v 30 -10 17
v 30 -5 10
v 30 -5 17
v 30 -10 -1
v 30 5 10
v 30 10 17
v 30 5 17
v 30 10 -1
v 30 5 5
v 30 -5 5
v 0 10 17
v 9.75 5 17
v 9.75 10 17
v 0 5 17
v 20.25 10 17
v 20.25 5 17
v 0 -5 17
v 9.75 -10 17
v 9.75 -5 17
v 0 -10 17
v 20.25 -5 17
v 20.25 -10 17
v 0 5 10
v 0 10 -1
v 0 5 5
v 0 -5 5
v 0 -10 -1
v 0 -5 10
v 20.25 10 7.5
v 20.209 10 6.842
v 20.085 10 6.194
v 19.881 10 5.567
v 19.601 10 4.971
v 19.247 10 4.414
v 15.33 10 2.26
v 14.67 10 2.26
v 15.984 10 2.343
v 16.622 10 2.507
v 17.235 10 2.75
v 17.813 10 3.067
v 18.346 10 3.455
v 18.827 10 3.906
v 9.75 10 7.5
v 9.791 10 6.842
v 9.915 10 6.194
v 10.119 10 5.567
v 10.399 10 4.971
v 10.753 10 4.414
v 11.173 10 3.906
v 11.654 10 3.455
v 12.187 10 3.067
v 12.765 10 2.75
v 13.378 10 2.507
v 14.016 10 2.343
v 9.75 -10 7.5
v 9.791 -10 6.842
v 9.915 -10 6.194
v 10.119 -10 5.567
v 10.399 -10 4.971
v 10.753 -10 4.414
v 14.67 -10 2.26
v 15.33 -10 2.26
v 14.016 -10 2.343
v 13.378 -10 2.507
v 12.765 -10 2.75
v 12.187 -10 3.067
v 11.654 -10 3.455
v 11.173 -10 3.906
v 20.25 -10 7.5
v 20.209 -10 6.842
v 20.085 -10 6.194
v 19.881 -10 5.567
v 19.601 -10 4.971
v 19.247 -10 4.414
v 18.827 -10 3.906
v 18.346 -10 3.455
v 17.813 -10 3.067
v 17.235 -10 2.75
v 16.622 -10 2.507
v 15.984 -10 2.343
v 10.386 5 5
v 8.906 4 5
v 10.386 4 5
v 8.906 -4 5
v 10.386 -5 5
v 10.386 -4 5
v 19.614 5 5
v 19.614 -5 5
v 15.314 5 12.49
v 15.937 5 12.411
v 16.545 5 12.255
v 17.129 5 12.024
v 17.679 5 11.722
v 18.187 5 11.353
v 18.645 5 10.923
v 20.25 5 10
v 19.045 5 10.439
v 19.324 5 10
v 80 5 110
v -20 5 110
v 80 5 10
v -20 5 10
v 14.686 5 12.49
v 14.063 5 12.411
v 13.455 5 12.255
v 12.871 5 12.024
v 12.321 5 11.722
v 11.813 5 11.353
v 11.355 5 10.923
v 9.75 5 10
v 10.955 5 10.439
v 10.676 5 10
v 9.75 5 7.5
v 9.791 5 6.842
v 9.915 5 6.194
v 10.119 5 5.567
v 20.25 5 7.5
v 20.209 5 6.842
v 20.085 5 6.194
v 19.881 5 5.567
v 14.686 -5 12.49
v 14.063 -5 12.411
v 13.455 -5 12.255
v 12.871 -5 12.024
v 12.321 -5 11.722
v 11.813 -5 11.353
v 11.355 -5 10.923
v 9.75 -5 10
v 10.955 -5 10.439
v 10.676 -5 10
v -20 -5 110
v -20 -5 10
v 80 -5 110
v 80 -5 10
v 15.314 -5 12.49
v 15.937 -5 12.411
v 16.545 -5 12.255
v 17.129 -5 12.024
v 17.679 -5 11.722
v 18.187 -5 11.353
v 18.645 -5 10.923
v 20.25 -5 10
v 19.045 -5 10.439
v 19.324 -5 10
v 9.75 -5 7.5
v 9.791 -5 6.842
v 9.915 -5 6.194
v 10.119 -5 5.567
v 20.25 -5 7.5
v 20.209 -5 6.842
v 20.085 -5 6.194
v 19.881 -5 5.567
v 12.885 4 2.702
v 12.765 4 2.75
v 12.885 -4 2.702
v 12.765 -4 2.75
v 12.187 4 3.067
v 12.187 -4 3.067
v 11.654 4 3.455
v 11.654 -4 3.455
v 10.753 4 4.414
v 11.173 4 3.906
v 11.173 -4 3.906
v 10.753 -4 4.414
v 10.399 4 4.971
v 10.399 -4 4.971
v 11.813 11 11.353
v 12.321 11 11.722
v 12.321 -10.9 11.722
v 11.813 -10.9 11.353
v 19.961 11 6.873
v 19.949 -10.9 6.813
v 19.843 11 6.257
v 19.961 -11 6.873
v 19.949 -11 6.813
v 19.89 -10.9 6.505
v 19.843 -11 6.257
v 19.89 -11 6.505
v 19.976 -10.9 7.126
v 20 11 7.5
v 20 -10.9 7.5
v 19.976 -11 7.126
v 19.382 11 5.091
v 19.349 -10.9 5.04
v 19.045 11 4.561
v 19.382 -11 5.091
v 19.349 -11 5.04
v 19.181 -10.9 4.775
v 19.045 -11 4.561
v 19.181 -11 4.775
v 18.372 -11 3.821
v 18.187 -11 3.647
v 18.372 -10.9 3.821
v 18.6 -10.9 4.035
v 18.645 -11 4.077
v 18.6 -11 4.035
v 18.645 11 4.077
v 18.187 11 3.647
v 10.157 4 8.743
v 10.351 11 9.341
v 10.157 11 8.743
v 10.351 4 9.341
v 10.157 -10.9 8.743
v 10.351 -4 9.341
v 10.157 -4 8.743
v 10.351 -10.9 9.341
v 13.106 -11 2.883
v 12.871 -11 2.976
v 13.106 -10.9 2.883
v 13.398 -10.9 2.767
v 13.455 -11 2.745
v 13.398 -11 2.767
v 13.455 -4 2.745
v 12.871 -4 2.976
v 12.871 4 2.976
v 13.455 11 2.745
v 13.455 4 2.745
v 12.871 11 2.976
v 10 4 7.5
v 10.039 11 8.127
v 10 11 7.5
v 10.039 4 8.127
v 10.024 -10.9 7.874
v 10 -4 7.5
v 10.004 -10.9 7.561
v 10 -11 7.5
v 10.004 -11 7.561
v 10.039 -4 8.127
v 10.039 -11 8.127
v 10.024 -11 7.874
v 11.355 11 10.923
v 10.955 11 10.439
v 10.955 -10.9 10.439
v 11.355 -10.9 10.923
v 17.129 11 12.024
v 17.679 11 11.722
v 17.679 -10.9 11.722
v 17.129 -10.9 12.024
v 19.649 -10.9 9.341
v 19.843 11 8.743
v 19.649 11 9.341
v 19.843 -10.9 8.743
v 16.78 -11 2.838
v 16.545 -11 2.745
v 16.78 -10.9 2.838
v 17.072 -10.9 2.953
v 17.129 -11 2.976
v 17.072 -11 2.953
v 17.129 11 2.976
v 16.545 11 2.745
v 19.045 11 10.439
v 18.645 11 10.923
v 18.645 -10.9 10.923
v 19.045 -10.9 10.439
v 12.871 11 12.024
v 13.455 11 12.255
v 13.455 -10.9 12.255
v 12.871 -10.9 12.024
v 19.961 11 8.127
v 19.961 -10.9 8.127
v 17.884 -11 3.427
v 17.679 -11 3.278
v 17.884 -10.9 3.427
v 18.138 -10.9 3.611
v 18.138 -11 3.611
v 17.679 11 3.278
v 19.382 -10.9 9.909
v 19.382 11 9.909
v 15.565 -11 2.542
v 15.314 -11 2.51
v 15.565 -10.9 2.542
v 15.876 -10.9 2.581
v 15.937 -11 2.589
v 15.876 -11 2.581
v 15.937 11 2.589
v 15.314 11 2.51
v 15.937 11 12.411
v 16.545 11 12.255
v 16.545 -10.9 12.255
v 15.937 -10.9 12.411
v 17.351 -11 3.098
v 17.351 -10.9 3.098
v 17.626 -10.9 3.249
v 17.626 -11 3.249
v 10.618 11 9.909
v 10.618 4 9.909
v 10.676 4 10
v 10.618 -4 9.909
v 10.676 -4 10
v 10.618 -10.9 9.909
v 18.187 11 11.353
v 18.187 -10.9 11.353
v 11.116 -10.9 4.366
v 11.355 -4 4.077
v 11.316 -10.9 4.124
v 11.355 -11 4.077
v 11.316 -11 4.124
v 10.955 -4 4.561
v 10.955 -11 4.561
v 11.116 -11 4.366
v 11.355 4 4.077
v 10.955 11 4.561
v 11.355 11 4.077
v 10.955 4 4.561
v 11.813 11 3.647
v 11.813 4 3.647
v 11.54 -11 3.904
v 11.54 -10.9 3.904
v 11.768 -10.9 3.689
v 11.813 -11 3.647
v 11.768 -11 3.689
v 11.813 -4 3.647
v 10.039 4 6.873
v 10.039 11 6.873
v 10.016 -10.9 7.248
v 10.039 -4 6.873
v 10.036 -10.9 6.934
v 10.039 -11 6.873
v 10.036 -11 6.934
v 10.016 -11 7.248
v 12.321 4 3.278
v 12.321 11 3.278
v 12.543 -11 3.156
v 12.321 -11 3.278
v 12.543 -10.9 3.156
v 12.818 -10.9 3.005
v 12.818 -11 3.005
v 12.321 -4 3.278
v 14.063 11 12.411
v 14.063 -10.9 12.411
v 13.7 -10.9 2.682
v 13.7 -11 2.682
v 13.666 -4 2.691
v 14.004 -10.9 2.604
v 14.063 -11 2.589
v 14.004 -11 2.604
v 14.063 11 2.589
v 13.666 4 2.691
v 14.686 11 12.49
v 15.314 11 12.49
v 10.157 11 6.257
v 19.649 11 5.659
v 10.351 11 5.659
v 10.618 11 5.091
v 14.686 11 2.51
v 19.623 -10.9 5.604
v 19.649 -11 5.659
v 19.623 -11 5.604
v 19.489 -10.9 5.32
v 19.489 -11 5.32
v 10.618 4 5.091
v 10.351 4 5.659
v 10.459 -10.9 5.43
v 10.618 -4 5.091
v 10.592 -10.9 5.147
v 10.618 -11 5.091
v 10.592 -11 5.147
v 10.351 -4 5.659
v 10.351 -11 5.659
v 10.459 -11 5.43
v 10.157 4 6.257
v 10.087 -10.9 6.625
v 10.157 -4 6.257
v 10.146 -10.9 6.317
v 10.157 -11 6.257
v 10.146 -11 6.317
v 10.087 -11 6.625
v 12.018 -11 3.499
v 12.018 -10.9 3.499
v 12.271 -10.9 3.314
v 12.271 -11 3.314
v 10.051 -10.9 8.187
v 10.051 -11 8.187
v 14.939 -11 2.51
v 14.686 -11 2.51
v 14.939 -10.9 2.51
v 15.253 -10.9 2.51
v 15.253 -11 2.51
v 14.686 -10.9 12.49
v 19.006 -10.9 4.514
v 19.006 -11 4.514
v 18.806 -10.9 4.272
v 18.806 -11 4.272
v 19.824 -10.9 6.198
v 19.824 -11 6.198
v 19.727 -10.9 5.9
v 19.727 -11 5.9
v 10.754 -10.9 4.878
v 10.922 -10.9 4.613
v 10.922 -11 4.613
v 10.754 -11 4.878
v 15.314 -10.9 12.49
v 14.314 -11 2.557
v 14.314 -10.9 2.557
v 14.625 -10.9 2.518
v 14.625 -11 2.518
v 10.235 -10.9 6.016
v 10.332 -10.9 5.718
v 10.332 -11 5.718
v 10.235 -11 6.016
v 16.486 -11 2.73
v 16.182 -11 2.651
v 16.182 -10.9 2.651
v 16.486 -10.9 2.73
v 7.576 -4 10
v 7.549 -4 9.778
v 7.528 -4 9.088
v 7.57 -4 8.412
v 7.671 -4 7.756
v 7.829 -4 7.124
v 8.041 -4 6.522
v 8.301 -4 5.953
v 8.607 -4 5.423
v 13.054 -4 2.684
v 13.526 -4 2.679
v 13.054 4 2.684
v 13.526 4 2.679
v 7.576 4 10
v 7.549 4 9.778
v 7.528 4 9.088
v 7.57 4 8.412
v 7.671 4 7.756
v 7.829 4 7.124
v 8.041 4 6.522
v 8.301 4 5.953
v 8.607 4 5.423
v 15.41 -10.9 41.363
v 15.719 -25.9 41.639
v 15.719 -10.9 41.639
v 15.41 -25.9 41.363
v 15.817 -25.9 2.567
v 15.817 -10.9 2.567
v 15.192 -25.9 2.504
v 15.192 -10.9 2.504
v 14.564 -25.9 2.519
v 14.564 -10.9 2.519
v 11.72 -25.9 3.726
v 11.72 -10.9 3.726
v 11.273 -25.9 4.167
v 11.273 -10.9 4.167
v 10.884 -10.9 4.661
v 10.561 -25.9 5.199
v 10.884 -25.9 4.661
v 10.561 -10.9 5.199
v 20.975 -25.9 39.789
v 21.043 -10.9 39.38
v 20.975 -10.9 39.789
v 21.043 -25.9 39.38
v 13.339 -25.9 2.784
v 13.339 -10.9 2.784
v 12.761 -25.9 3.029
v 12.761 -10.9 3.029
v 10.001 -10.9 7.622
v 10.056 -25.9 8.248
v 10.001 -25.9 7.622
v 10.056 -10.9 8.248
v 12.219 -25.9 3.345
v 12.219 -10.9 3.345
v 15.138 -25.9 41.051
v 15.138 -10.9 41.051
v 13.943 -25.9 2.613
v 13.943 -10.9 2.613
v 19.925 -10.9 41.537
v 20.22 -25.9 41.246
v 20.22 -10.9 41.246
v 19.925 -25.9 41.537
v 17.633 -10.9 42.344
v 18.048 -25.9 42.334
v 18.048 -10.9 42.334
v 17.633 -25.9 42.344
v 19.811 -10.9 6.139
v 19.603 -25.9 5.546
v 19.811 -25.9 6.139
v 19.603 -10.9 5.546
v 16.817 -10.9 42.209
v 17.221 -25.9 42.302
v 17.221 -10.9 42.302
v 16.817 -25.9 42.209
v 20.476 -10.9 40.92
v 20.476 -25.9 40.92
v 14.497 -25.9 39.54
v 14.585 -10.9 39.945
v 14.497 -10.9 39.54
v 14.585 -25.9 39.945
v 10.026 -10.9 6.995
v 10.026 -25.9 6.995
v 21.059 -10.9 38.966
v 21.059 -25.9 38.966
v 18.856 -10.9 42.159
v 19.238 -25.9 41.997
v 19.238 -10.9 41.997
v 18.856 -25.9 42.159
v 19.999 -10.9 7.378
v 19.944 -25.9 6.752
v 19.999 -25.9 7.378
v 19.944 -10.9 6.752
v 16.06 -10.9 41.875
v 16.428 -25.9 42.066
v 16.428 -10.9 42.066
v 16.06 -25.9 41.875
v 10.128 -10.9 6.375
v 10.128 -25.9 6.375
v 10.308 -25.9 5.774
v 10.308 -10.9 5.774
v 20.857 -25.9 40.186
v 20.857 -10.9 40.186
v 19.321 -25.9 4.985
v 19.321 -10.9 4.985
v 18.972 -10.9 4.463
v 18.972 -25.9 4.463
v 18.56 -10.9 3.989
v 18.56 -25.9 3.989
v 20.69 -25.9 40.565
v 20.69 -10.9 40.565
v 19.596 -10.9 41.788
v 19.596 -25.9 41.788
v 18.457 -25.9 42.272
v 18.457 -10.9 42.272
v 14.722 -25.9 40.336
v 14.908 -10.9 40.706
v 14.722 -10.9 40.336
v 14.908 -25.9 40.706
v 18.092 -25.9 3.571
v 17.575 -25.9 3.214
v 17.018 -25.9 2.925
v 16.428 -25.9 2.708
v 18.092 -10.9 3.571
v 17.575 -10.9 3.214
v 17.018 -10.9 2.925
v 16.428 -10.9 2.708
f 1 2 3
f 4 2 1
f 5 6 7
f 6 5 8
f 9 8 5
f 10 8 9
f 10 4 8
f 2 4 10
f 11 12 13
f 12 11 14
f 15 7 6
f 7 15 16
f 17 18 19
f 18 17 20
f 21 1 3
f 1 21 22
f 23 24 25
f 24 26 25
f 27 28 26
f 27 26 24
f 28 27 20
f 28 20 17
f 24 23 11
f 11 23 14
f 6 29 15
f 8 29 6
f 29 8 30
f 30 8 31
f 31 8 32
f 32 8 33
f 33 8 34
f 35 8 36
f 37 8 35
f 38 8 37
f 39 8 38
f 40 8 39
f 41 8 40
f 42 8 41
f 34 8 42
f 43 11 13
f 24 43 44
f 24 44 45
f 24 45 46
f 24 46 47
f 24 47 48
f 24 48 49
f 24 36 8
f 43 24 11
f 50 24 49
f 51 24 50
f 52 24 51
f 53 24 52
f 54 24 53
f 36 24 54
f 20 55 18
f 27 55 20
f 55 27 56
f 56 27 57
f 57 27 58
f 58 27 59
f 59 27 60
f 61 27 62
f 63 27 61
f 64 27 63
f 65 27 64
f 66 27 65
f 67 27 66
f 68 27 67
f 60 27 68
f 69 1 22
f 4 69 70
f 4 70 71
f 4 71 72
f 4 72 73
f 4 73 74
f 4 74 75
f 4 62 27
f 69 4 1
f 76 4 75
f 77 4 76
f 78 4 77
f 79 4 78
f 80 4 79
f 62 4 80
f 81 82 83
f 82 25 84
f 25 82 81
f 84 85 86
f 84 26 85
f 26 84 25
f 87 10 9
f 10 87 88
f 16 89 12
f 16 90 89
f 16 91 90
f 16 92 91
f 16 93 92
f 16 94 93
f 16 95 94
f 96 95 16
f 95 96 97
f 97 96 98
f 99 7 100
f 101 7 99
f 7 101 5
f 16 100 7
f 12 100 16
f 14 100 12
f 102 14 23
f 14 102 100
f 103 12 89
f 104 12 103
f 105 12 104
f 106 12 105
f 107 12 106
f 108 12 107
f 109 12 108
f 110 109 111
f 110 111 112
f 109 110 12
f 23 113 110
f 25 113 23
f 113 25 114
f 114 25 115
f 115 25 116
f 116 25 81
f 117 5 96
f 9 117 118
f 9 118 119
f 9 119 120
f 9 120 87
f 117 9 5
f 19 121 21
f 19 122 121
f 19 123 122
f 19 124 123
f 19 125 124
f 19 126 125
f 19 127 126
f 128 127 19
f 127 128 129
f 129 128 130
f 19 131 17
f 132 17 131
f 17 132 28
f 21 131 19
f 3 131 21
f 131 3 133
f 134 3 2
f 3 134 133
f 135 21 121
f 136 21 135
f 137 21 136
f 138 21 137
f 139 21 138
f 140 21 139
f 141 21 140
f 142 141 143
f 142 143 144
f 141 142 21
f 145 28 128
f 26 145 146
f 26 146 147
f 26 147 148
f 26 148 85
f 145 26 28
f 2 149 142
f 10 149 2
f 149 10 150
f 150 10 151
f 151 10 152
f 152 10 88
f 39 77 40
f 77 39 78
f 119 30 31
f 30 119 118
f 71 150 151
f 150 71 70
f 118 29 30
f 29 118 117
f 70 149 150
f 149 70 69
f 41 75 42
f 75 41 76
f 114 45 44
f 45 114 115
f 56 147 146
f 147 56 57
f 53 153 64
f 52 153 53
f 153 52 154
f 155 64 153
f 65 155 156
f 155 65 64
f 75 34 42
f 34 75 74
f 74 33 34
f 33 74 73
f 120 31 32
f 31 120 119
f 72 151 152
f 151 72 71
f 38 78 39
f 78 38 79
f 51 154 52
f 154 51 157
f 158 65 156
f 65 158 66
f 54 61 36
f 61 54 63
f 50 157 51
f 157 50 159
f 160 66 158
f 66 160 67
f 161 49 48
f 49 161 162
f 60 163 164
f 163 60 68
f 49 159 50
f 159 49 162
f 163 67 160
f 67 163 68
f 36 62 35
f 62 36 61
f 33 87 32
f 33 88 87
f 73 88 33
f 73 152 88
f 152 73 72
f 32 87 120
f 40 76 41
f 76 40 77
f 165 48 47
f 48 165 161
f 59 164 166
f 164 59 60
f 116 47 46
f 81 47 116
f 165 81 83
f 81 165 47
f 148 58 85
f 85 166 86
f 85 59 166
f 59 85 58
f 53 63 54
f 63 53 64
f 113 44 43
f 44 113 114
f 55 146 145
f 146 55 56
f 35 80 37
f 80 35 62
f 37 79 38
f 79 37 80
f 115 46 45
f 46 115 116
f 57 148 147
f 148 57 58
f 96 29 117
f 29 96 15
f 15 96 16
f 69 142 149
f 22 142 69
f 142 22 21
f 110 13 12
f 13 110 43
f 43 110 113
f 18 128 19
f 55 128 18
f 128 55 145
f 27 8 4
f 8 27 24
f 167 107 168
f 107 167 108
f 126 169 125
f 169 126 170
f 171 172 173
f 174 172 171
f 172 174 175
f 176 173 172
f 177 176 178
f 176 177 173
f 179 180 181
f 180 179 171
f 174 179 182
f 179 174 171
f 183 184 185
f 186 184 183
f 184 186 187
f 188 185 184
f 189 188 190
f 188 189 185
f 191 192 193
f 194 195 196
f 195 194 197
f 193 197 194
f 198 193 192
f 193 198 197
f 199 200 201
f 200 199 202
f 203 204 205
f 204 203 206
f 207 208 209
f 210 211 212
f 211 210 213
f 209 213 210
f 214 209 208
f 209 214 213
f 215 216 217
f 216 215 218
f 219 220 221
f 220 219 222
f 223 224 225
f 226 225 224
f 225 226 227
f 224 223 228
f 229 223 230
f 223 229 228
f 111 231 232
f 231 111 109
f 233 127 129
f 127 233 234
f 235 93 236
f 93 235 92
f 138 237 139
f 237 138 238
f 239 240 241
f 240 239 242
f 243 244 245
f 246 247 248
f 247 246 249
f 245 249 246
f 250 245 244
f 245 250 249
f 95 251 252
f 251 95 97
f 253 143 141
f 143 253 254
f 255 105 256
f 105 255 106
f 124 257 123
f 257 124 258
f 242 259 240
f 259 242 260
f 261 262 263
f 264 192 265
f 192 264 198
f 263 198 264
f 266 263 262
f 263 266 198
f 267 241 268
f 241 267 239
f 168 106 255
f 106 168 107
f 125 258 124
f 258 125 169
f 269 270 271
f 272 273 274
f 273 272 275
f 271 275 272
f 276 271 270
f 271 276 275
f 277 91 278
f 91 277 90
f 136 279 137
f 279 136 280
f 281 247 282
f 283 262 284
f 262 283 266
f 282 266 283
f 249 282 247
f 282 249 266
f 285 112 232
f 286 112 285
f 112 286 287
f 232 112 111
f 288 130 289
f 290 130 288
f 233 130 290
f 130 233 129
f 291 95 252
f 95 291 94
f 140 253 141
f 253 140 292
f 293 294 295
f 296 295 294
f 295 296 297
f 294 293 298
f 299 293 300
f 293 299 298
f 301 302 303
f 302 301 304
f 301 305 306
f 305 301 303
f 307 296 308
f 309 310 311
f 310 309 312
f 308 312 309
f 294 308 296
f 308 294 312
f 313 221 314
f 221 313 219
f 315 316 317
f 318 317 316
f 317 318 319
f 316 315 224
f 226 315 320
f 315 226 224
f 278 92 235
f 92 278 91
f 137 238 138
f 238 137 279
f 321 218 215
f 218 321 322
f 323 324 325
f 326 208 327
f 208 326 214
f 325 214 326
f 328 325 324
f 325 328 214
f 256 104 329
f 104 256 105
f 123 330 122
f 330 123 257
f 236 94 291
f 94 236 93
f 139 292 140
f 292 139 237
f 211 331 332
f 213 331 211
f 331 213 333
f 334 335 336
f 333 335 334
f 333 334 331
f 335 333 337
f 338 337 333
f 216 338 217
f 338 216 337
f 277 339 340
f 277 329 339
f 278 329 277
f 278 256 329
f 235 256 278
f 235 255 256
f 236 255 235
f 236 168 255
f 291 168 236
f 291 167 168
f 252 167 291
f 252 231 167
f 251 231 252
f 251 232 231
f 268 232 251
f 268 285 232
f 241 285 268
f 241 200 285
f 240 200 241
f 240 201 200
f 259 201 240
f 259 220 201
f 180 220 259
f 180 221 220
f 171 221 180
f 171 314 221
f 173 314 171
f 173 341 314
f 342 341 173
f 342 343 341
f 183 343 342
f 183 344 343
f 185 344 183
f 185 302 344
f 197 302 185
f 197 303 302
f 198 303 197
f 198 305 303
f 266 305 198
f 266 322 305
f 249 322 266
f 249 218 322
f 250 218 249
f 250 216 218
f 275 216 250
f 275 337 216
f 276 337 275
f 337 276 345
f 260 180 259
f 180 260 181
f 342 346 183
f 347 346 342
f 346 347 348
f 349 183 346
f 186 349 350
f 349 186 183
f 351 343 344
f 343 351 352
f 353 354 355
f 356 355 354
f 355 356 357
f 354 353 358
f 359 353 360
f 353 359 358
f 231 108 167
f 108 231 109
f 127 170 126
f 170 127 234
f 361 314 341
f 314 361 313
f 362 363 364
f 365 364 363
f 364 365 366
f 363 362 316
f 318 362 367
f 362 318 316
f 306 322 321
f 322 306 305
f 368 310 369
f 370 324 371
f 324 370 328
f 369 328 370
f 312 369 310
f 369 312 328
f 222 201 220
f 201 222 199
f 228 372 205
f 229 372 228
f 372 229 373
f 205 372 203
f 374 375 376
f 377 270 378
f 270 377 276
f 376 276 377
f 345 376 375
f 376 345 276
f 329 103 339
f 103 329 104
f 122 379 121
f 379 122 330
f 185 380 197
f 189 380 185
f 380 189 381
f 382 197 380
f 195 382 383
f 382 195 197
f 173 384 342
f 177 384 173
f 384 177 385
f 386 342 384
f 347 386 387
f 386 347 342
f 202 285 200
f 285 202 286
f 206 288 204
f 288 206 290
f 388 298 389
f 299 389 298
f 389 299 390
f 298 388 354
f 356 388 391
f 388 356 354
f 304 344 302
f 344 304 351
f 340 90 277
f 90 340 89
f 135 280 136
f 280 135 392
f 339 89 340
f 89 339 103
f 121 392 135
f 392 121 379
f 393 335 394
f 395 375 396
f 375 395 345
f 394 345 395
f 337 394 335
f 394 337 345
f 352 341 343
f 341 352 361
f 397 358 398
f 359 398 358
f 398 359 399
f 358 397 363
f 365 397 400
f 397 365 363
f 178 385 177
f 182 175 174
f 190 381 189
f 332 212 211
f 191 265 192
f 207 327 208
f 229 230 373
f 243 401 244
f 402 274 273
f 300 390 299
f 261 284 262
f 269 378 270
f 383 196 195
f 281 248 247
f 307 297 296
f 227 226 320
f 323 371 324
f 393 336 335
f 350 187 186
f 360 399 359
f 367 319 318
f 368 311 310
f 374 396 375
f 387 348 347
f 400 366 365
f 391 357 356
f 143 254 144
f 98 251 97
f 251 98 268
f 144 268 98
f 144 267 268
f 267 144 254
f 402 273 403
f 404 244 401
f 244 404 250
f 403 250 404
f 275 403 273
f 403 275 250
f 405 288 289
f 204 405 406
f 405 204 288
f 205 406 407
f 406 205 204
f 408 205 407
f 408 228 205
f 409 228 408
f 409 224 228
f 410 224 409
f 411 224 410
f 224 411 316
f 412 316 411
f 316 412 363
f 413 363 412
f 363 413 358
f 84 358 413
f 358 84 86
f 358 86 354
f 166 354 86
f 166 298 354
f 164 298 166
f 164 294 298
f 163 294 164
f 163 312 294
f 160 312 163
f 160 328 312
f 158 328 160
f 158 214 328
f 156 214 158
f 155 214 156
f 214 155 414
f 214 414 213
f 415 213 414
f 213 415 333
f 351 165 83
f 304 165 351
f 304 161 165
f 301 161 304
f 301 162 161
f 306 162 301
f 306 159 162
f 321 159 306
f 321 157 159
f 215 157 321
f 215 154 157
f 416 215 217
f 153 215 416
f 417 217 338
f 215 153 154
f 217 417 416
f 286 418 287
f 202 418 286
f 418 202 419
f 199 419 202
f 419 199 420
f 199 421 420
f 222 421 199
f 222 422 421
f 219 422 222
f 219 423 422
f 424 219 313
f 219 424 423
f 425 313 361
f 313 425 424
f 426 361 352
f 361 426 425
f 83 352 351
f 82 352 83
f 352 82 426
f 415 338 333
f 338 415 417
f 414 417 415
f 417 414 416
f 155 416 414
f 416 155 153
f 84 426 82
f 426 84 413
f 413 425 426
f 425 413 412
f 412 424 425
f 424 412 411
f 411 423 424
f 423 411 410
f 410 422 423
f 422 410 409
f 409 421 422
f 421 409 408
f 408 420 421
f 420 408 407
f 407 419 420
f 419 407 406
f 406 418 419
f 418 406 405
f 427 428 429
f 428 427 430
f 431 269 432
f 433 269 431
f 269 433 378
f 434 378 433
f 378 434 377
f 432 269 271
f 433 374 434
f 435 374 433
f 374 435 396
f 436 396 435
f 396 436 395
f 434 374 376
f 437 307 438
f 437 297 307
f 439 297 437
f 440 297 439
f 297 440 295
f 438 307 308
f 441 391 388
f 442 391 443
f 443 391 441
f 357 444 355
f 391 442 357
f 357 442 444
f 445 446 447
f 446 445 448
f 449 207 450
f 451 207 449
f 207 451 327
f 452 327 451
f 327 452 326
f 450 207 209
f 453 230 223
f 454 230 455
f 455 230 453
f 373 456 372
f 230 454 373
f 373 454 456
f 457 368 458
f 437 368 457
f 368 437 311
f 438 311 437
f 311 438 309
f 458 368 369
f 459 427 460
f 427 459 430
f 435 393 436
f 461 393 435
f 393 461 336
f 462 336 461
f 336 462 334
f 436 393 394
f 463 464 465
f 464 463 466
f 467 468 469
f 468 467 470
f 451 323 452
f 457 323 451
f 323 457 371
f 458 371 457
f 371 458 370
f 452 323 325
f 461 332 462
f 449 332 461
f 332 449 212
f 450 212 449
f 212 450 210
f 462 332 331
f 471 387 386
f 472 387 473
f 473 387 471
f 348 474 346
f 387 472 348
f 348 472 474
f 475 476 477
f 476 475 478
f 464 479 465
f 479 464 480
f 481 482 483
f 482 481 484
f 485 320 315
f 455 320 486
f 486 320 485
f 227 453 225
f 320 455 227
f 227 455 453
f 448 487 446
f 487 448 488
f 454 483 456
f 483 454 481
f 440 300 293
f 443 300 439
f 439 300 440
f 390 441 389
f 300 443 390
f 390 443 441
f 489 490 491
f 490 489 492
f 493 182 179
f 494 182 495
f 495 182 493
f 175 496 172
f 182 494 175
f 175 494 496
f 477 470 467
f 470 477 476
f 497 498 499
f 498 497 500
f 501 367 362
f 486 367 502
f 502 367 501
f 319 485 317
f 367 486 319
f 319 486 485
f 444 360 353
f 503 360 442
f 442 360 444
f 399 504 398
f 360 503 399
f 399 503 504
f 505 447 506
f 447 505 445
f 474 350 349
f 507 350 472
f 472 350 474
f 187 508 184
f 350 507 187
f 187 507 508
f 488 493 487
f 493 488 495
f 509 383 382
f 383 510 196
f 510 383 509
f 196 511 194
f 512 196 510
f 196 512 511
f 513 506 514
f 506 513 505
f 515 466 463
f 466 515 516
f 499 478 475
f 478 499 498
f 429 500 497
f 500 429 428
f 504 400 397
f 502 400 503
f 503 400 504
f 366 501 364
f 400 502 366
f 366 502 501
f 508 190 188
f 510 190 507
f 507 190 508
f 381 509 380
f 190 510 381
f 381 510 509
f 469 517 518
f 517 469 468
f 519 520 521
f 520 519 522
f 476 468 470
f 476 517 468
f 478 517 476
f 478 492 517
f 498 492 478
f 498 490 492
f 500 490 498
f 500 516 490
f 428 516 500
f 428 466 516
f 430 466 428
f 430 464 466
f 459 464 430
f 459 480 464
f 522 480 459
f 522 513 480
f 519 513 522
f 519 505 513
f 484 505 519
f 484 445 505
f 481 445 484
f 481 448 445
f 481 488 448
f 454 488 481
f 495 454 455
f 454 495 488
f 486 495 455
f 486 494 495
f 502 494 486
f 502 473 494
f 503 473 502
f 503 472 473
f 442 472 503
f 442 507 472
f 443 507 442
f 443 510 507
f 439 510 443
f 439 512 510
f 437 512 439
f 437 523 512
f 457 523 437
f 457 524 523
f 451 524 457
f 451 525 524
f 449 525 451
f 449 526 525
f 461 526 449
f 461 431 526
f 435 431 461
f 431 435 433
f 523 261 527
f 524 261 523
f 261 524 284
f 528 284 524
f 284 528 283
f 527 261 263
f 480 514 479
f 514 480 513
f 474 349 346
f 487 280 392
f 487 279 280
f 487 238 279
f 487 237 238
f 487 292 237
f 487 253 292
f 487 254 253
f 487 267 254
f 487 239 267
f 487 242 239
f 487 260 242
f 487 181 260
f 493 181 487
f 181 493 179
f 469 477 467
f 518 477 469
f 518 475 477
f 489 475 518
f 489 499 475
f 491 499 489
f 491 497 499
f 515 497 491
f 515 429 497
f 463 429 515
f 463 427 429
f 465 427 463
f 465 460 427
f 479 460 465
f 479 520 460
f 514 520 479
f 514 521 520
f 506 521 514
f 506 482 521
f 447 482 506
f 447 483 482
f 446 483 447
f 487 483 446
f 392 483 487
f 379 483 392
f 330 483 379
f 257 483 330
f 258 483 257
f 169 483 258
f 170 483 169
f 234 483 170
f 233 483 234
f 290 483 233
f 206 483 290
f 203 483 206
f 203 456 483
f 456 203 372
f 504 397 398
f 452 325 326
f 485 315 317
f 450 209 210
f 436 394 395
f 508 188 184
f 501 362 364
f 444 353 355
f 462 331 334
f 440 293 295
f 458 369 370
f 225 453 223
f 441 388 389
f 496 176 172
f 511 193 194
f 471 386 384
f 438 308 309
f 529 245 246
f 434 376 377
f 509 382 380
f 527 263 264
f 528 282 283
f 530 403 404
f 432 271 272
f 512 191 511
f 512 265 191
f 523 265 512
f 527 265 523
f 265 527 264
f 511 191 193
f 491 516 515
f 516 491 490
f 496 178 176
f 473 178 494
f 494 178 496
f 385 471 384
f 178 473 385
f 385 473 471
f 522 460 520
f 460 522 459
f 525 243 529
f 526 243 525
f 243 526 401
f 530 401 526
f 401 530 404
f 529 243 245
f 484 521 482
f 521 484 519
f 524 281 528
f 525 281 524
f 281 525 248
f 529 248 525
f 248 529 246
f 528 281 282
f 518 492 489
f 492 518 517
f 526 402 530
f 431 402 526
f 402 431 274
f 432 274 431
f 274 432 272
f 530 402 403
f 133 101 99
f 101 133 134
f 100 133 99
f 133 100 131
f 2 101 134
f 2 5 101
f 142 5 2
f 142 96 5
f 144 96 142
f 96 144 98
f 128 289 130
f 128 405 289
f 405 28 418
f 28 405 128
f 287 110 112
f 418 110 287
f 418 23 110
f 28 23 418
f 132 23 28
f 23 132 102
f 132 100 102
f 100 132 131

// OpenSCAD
// a window stopper with rotating wedge
// (all sizes in millimeter)

module window_stopper(

    /* parameters */
    
    // for window
    window_thickness = 10,   // thickness of window frame
    windowsill_dist = 10,        // distance between window and windowsill
    // for window_stopper
    windowsill_adj = 1,     // adjustment for windowsill distance
    stopper_width = 30,     // width of the stopper
    material_thickness = 5,     // material thickness of the stopper
    window_overlap = 7,     // overlap of stopper and window
    axle_dm = 10,       // axle diameter
    axle_clearance = 0.5,       // axle clearance towards bushing
    // for stopper
    wedge_start_r = 0,      // wedge start radius
    wedge_end_r = 11,      // wedge end radius
    wedge_angle = 42,       // start angle of wedge
    lever_depth = 15,       // depth of lever
    lever_length = 40,      // length of lever
    lever_angle = 15,       // start angle of lever
    // printing option
    print_version = false
    
) {
    
    $fn = 50;
    
    axle_height =
        material_thickness + (windowsill_dist - material_thickness) / 2;
    
    module window() {
        color("LightSkyBlue")
            translate( [ -20, -window_thickness / 2, windowsill_dist])
                cube( [100, window_thickness, 100]);
        }
    
    module stopper_case() {
        case_size = [
            stopper_width,
            window_thickness + material_thickness * 2,
            windowsill_dist + window_overlap
        ];
        
        translate( [0, -case_size.y / 2, 0] )
        difference() {
            cube( case_size );
            axle_bushing = axle_dm + axle_clearance;
            
            translate( [-1, material_thickness, material_thickness] )
                cube( [case_size.x + 2, window_thickness, case_size.z] );
            
            translate( [case_size.x / 2, -1, axle_height] )
                rotate( [-90,0.0])
                    cylinder( d = axle_bushing, h = case_size.y + 2);
            
            translate( [(case_size.x - axle_bushing) / 2, -1, axle_height] )
                cube( [axle_bushing, case_size.y + 2, case_size.z] );
        }
        
        translate( [0, -case_size.y / 2, -windowsill_adj] )
            cube( [case_size.x, case_size.y, windowsill_adj] );
        
        }
    
    module stopper( angle = 0 ) {
        axle_length = window_thickness + material_thickness * 2 + 2;
        
        translate( [stopper_width / 2, -axle_length / 2, axle_height] )
            rotate( [ -90, 0, 0] )
                cylinder( d = axle_dm, h = axle_length );
        
        points = [
            for ( i = [0:5:360] )
                let ( radius = wedge_start_r + (wedge_end_r - wedge_start_r) * i / 360 )
            [ cos(i) * radius, sin(i) * radius ]
        ];
        
//        points = [
//            for ( i = [0:5:360] )
//            [ cos(i) * (wedge_start_r + (wedge_end_r - wedge_start_r) * i / 360), sin(i) * (wedge_start_r + (wedge_end_r - wedge_start_r) * i / 360) ]
//        ];
            
        wedge_width = window_thickness - 2;
            
//            echo(points);
       translate( [stopper_width / 2, -wedge_width / 2, axle_height] )
            rotate( [-90, 0, 0] )
            rotate( [0, 0, wedge_angle + angle] )
            linear_extrude( height = wedge_width )
            polygon(points);
            
        translate( [stopper_width / 2, -axle_length / 2 + 0.1, axle_height] )
            rotate( [0, lever_angle + angle, 0] )
            rotate( [90,0,0])
            linear_extrude( height = lever_depth )
            hull() {
            circle ( d = axle_dm );
            translate( [lever_length - axle_dm / 2 - axle_dm / 3, 0, 0] )
               circle( d = axle_dm * 0.66);
        }
            
        }
    
    if (print_version) {
        stopper_case();
        translate([
            stopper_width, 
            0, 
            (window_thickness + 2 * material_thickness + 2) / 2 + 
                lever_depth - 0.1
        ])
            rotate( [ 90, 0, 0])
            stopper();
        } else {
    window();
    stopper_case();
    stopper( -100 );
    }
}

window_stopper( /* parameters */ print_version = false );
